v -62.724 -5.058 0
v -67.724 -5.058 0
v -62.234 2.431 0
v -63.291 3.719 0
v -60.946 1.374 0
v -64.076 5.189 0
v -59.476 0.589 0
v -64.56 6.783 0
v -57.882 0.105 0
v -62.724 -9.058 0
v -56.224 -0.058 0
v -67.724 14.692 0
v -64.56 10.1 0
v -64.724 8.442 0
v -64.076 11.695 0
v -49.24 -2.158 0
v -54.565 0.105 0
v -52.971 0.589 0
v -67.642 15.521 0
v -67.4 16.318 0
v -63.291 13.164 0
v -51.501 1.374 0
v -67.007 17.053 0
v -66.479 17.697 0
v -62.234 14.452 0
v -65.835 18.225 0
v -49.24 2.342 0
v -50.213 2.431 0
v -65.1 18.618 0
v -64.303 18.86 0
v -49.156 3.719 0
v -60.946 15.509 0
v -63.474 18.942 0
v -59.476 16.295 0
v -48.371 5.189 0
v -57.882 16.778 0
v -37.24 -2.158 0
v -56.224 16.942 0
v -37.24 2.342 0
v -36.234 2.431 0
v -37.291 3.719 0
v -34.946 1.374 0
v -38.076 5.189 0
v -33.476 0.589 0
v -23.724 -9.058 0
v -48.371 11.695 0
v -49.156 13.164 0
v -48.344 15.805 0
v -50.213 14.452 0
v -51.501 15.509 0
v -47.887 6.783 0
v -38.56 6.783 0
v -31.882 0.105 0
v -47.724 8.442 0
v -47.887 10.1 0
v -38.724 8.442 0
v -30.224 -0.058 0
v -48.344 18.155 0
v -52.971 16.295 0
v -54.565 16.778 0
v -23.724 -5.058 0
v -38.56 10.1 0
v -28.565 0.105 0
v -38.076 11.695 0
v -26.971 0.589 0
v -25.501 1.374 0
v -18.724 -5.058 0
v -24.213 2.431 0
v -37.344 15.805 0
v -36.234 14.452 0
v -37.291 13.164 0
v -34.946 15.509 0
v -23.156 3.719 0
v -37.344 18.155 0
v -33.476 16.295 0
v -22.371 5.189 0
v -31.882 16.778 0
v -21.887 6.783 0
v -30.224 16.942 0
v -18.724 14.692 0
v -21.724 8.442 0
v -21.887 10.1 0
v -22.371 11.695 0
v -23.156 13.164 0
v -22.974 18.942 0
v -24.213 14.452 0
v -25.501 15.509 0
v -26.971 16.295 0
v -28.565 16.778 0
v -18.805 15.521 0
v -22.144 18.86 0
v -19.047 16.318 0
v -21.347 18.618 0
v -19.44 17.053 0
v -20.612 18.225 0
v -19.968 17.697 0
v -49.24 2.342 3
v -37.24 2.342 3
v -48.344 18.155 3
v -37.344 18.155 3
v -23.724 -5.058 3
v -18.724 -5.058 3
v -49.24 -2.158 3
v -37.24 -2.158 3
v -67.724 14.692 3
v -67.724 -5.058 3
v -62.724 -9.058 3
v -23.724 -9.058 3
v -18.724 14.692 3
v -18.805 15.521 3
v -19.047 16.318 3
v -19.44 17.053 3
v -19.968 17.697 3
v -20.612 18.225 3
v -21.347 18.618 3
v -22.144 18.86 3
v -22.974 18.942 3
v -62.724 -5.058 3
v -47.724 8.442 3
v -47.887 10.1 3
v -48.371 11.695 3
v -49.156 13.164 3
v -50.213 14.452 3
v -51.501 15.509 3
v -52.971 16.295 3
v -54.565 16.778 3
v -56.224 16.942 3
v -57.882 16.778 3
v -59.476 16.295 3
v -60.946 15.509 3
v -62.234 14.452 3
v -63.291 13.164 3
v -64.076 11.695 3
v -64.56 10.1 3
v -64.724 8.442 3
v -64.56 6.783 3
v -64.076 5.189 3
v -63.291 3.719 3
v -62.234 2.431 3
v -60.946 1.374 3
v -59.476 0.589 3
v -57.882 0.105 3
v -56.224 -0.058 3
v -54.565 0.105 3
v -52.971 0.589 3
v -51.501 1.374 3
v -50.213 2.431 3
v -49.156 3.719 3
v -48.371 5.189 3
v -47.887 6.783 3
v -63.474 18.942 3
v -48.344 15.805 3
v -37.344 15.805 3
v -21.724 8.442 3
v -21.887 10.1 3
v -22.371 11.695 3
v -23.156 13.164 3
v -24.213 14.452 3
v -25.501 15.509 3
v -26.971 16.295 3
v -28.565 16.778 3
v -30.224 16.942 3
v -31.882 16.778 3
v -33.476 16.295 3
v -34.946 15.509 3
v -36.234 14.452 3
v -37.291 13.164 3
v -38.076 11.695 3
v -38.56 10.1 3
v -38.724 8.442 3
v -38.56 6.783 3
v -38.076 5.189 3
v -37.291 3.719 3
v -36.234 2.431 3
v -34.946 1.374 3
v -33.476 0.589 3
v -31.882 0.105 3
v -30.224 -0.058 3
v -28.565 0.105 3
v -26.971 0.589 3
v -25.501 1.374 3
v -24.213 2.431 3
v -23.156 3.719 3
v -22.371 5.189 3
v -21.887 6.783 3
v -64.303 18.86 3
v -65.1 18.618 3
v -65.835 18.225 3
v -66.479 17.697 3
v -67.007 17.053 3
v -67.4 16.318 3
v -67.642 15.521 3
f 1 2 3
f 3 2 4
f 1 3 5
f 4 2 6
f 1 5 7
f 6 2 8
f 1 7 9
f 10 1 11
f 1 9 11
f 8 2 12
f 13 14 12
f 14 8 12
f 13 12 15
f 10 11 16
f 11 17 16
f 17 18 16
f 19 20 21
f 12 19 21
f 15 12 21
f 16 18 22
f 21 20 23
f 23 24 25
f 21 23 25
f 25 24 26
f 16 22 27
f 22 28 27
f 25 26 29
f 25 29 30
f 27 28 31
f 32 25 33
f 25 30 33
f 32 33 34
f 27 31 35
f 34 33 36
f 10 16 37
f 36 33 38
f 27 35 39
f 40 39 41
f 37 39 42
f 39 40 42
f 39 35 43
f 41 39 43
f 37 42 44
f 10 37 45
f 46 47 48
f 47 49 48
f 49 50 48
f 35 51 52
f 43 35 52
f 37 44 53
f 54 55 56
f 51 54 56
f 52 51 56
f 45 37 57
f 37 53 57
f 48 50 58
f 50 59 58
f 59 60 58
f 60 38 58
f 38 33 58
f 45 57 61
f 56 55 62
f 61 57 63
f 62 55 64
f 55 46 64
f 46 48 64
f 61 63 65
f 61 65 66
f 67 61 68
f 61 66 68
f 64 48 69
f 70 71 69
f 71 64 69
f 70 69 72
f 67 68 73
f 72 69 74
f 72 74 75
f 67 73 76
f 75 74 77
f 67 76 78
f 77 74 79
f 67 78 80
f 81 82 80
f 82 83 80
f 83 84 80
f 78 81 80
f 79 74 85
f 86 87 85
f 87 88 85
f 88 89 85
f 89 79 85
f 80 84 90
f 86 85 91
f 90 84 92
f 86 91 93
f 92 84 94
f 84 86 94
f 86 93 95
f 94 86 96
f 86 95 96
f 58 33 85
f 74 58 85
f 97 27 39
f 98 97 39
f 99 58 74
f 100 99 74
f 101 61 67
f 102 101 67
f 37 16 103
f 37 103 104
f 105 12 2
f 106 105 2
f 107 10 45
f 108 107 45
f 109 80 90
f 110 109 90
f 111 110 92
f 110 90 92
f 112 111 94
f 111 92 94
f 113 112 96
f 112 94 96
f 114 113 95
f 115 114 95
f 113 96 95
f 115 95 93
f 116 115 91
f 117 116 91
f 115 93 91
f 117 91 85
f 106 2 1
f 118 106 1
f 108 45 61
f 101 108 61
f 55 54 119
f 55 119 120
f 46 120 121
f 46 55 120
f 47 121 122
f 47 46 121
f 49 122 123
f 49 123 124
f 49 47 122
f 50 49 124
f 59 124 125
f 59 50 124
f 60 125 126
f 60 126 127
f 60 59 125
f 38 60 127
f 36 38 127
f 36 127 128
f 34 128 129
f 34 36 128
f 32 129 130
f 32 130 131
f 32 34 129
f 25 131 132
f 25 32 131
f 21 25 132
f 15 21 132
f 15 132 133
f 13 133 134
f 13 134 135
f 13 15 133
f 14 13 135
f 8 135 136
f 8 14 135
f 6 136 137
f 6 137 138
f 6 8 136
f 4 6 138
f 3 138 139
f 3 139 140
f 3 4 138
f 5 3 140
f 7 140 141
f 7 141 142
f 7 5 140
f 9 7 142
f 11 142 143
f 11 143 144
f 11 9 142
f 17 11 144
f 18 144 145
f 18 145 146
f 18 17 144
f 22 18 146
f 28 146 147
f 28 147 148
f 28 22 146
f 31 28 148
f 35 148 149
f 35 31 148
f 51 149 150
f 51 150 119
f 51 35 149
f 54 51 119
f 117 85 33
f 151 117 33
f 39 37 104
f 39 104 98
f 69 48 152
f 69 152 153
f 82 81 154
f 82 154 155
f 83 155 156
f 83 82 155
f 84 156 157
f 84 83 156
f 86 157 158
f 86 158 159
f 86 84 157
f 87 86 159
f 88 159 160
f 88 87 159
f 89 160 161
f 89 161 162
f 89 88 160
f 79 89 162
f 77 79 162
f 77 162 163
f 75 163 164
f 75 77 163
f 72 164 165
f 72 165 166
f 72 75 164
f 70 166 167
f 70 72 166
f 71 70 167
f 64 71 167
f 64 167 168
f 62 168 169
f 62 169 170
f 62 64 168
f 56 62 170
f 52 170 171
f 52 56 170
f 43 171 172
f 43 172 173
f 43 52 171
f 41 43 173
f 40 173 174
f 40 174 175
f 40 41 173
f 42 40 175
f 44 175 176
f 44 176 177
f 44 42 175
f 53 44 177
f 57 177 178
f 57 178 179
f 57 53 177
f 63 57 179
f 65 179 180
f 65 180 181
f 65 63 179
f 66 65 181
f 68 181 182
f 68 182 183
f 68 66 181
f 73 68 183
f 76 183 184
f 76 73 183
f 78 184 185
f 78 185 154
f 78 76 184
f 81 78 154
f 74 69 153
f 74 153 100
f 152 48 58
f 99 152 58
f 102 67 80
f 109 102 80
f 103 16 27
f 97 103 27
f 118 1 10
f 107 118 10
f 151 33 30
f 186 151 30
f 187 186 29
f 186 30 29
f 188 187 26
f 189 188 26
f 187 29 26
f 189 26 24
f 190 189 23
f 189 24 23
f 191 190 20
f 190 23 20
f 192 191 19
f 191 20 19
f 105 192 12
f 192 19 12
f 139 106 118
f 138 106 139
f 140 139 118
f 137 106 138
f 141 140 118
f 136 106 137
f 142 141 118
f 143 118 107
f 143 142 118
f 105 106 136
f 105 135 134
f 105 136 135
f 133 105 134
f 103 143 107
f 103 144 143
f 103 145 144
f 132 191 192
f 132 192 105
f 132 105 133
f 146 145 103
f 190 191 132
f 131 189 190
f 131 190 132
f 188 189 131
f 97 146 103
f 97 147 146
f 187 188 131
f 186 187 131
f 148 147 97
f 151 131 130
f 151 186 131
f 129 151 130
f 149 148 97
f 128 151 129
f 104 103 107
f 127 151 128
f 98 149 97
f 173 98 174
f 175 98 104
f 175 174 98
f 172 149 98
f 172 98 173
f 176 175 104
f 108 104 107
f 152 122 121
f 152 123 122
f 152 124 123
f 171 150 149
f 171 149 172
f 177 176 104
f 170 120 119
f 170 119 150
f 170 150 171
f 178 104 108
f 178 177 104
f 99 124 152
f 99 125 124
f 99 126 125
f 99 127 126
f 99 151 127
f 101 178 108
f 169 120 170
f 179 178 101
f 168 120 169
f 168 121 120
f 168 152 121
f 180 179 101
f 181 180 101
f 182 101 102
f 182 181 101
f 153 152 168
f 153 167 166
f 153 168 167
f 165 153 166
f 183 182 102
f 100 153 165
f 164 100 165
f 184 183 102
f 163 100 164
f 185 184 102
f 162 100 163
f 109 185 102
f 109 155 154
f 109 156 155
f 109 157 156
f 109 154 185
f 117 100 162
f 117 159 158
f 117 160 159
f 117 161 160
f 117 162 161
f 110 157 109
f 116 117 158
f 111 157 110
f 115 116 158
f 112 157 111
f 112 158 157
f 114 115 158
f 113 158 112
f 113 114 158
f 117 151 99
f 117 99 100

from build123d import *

# Parameters (mm, degrees)
SKETCH1_R           = 8.5
SKETCH1_W           = 12
SKETCH1_H           = 4.5
SKETCH1_W_2         = 11
SKETCH1_H_2         = 2.35
BOSS_EXTRUDE2_DEPTH = 3


with BuildPart() as part:
    # Sketch1 → Boss-Extrude2 (new body)
    with BuildSketch(Plane.XY):
        with BuildLine():
            Line((-67.723514566, 14.691706599), (-67.723514566, -5.058293401))
            Line((-67.723514566, -5.058293401), (-62.723514566, -5.058293401))
            Line((-62.723514566, -5.058293401), (-62.723514566, -9.058293401))
            Line((-62.723514566, -9.058293401), (-23.723514566, -9.058293401))
            Line((-23.723514566, -9.058293401), (-23.723514566, -5.058293401))
            Line((-23.723514566, -5.058293401), (-18.723514566, -5.058293401))
            Line((-18.723514566, -5.058293401), (-18.723514566, 14.691706599))
            ThreePointArc((-18.723514566, 14.691706599), (-19.968310746, 17.696910419), (-22.973514566, 18.941706599))
            Line((-22.973514566, 18.941706599), (-63.473514566, 18.941706599))
            ThreePointArc((-63.473514566, 18.941706599), (-66.478718386, 17.696910419), (-67.723514566, 14.691706599))
        make_face()
        with Locations((-56.223514566, 8.441706599)):
            Circle(SKETCH1_R, mode=Mode.SUBTRACT)
        with Locations((-30.223514566, 8.441706599)):
            Circle(SKETCH1_R, mode=Mode.SUBTRACT)
        with Locations((-43.240297901, 0.09191466)):
            Rectangle(SKETCH1_W, SKETCH1_H, mode=Mode.SUBTRACT)
        with Locations((-42.84448226, 16.979921864)):
            Rectangle(SKETCH1_W_2, SKETCH1_H_2, mode=Mode.SUBTRACT)
    extrude(amount=BOSS_EXTRUDE2_DEPTH)


solid = part.part
